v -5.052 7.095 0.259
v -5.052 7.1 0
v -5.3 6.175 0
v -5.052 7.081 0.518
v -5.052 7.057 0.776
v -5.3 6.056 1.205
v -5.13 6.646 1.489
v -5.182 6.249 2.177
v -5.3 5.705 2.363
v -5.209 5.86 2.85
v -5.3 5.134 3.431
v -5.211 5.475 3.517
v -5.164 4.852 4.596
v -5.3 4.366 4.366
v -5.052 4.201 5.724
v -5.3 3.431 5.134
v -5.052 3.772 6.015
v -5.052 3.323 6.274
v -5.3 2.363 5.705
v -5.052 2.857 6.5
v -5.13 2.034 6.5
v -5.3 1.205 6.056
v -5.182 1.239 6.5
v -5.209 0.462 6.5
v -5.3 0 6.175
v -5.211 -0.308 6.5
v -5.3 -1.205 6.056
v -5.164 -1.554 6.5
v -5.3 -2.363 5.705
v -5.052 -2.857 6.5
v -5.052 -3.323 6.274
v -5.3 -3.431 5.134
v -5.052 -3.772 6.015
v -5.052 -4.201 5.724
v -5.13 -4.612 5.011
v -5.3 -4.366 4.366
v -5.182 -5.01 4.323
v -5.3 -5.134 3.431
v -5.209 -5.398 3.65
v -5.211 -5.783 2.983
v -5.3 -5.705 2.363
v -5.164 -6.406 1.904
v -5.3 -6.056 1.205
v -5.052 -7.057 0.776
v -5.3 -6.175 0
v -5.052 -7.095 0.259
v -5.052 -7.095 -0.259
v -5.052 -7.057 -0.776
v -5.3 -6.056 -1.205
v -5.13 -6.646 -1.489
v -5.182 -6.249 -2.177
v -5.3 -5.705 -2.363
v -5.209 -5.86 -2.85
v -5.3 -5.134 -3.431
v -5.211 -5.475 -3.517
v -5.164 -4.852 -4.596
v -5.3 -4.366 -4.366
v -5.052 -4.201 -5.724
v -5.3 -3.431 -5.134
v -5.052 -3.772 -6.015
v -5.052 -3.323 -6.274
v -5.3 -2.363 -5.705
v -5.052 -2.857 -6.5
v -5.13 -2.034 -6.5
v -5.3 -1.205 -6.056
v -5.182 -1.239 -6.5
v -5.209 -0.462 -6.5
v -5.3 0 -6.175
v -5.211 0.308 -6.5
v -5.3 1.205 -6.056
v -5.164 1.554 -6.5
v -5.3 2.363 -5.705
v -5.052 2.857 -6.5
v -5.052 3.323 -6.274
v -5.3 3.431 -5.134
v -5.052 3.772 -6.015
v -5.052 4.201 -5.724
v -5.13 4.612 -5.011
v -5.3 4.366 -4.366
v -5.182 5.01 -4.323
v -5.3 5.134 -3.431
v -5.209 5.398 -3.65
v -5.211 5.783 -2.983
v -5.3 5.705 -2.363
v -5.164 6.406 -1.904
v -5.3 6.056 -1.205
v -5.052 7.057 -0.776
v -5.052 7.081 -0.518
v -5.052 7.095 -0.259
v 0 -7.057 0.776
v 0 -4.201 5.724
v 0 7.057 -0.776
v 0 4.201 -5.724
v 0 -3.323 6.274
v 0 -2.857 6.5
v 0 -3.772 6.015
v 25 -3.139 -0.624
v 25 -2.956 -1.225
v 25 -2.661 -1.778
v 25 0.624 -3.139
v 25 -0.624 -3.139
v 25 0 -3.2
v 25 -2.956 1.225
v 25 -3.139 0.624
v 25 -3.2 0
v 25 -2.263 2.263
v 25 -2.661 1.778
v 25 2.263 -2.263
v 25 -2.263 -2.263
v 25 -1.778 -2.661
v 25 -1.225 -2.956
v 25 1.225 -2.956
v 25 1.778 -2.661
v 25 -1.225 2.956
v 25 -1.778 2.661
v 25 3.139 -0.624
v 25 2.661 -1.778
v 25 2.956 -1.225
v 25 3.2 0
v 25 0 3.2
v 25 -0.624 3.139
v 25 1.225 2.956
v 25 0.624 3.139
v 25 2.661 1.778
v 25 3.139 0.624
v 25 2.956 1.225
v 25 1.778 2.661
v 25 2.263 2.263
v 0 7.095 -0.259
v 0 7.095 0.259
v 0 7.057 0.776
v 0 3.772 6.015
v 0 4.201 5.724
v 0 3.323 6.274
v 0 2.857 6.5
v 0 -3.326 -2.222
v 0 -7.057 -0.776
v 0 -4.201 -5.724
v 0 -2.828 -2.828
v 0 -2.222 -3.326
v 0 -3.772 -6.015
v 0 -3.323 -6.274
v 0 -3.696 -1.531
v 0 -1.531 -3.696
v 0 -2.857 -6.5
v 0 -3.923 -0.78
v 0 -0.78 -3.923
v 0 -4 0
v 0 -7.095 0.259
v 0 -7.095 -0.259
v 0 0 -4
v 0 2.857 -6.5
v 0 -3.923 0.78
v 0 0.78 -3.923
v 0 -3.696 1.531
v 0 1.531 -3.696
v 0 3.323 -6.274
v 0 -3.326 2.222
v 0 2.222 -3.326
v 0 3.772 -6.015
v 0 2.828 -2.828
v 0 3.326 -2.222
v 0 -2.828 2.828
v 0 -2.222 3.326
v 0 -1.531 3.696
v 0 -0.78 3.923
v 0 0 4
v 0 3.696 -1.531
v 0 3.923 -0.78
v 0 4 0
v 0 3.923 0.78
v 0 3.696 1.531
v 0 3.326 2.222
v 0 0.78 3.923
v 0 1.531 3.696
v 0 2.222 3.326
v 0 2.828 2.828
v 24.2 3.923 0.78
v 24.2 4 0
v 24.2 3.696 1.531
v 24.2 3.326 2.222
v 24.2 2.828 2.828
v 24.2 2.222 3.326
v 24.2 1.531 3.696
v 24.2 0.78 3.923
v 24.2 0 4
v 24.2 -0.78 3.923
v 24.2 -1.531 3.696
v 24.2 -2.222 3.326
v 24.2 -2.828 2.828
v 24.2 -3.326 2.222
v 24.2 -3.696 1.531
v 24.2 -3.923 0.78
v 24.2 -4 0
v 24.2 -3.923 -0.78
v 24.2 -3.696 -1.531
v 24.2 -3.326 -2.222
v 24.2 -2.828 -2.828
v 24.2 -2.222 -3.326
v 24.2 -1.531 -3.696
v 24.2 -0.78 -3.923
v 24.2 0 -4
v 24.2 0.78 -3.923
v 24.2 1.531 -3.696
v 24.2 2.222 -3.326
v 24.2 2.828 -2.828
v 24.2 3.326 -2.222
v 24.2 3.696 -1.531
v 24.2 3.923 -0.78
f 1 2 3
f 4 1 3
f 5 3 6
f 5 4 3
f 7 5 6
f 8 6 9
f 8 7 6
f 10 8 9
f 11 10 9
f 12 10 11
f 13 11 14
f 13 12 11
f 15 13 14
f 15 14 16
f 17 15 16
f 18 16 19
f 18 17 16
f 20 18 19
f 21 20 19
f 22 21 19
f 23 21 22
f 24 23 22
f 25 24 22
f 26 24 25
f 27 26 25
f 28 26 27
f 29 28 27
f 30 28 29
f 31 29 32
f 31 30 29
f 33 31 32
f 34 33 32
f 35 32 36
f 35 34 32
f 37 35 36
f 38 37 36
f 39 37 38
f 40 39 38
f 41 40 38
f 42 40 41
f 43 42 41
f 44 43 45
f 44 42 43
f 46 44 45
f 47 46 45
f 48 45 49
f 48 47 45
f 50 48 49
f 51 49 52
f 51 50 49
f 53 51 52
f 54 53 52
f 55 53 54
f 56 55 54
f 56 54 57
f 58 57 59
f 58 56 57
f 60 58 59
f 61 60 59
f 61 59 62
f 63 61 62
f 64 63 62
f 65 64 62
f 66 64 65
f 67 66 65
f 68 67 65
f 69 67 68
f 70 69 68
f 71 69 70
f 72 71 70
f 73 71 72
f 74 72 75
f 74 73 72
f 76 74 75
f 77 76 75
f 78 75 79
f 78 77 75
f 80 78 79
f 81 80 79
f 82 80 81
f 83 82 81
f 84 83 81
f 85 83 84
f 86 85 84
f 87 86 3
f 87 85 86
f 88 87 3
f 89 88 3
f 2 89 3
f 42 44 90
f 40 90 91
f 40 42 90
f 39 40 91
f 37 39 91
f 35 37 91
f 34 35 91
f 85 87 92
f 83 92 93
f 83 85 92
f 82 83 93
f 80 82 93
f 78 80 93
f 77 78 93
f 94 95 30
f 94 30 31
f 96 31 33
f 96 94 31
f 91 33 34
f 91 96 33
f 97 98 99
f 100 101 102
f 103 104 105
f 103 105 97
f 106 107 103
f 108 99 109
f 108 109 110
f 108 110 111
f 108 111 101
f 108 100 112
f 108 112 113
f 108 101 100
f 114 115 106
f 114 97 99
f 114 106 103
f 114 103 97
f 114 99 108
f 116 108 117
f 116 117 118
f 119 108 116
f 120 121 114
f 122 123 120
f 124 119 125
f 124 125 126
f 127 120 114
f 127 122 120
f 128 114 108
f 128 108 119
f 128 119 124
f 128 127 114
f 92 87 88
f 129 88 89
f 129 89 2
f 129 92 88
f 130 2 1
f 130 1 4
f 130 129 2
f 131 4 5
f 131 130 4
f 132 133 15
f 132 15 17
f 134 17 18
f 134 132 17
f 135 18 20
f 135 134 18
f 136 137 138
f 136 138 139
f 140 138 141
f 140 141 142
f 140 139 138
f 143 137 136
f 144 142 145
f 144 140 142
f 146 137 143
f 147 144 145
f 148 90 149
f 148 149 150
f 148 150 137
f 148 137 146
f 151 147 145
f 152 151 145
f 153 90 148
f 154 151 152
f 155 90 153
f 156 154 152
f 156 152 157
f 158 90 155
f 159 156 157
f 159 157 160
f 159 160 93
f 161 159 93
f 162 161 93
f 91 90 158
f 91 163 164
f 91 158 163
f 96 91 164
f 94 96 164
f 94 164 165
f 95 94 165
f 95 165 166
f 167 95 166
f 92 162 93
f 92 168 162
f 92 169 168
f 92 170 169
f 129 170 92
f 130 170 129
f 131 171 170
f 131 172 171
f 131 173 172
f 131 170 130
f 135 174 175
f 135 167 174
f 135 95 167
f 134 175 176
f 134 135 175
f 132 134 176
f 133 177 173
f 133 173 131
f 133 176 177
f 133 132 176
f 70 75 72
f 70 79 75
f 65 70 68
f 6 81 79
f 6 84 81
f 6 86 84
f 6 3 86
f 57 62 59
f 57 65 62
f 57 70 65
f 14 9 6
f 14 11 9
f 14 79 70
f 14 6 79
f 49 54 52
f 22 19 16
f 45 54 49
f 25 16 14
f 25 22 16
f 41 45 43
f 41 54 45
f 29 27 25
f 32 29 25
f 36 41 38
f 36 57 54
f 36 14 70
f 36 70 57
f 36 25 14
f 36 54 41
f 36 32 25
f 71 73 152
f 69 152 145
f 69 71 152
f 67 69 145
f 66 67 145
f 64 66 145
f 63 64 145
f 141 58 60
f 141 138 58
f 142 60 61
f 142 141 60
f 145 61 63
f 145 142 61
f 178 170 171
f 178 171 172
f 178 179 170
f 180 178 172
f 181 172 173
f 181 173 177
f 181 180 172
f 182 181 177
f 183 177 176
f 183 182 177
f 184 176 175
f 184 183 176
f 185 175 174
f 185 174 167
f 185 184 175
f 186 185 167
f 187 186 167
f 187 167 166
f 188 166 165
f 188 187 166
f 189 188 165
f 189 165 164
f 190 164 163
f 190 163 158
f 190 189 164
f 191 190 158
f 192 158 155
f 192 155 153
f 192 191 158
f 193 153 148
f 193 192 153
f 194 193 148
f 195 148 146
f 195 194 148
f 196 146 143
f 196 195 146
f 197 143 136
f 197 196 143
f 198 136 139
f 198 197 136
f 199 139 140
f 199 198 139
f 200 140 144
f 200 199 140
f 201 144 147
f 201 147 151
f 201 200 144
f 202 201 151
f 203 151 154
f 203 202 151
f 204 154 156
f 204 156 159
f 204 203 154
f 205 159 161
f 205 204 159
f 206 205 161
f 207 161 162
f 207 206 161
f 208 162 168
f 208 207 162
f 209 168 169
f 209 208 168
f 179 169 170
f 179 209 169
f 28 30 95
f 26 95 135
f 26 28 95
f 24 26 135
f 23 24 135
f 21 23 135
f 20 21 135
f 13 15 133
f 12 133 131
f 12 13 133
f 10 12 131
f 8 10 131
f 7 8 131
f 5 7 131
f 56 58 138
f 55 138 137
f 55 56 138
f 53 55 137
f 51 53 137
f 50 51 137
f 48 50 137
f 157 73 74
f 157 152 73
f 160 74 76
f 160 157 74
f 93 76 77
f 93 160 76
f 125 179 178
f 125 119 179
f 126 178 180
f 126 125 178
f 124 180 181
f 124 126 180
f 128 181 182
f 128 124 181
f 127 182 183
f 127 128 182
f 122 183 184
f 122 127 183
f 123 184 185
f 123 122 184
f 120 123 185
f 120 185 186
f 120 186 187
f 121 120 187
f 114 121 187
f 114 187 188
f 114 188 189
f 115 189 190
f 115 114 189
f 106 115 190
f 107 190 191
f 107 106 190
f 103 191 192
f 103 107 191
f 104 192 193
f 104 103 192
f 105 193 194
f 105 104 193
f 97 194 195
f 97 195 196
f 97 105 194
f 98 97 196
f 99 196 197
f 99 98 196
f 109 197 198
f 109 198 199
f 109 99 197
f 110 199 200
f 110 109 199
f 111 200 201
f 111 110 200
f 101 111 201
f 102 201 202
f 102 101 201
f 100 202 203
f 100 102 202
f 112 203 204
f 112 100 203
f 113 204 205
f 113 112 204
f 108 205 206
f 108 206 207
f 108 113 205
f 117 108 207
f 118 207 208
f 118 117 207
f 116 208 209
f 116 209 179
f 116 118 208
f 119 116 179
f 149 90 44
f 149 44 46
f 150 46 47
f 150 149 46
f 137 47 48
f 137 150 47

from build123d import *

# Parameters (mm, degrees)
SKETCH_2_OUTSIDE_W  = 23.47
SKETCH_2_OUTSIDE_H  = 23.47
CUT_EXTRUDE_1_DEPTH = 30.3


with BuildPart() as part:
    # Эскиз1 → Повернуть1 (revolve)
    with BuildSketch(Plane.XY):
        Polygon((-5.3, 0), (-5.3, 6.175), (-5.052146997, 7.1), (0, 7.1), (0, 4), (24.2, 4), (25, 3.2), (25, 0), align=None)
    revolve(axis=Axis((-1000, 0, 0), (1, 0, 0)))

    # Эскиз2 outside → Вырез-Вытянуть1 (cut)
    with BuildSketch(Plane.ZY.offset(5.3)):
        Rectangle(SKETCH_2_OUTSIDE_W, SKETCH_2_OUTSIDE_H)
        Polygon((0, 7.505553499), (-6.5, 3.75277675), (-6.5, -3.75277675), (0, -7.505553499), (6.5, -3.75277675), (6.5, 3.75277675), align=None, mode=Mode.SUBTRACT)
    extrude(amount=-CUT_EXTRUDE_1_DEPTH, mode=Mode.SUBTRACT)


solid = part.part
